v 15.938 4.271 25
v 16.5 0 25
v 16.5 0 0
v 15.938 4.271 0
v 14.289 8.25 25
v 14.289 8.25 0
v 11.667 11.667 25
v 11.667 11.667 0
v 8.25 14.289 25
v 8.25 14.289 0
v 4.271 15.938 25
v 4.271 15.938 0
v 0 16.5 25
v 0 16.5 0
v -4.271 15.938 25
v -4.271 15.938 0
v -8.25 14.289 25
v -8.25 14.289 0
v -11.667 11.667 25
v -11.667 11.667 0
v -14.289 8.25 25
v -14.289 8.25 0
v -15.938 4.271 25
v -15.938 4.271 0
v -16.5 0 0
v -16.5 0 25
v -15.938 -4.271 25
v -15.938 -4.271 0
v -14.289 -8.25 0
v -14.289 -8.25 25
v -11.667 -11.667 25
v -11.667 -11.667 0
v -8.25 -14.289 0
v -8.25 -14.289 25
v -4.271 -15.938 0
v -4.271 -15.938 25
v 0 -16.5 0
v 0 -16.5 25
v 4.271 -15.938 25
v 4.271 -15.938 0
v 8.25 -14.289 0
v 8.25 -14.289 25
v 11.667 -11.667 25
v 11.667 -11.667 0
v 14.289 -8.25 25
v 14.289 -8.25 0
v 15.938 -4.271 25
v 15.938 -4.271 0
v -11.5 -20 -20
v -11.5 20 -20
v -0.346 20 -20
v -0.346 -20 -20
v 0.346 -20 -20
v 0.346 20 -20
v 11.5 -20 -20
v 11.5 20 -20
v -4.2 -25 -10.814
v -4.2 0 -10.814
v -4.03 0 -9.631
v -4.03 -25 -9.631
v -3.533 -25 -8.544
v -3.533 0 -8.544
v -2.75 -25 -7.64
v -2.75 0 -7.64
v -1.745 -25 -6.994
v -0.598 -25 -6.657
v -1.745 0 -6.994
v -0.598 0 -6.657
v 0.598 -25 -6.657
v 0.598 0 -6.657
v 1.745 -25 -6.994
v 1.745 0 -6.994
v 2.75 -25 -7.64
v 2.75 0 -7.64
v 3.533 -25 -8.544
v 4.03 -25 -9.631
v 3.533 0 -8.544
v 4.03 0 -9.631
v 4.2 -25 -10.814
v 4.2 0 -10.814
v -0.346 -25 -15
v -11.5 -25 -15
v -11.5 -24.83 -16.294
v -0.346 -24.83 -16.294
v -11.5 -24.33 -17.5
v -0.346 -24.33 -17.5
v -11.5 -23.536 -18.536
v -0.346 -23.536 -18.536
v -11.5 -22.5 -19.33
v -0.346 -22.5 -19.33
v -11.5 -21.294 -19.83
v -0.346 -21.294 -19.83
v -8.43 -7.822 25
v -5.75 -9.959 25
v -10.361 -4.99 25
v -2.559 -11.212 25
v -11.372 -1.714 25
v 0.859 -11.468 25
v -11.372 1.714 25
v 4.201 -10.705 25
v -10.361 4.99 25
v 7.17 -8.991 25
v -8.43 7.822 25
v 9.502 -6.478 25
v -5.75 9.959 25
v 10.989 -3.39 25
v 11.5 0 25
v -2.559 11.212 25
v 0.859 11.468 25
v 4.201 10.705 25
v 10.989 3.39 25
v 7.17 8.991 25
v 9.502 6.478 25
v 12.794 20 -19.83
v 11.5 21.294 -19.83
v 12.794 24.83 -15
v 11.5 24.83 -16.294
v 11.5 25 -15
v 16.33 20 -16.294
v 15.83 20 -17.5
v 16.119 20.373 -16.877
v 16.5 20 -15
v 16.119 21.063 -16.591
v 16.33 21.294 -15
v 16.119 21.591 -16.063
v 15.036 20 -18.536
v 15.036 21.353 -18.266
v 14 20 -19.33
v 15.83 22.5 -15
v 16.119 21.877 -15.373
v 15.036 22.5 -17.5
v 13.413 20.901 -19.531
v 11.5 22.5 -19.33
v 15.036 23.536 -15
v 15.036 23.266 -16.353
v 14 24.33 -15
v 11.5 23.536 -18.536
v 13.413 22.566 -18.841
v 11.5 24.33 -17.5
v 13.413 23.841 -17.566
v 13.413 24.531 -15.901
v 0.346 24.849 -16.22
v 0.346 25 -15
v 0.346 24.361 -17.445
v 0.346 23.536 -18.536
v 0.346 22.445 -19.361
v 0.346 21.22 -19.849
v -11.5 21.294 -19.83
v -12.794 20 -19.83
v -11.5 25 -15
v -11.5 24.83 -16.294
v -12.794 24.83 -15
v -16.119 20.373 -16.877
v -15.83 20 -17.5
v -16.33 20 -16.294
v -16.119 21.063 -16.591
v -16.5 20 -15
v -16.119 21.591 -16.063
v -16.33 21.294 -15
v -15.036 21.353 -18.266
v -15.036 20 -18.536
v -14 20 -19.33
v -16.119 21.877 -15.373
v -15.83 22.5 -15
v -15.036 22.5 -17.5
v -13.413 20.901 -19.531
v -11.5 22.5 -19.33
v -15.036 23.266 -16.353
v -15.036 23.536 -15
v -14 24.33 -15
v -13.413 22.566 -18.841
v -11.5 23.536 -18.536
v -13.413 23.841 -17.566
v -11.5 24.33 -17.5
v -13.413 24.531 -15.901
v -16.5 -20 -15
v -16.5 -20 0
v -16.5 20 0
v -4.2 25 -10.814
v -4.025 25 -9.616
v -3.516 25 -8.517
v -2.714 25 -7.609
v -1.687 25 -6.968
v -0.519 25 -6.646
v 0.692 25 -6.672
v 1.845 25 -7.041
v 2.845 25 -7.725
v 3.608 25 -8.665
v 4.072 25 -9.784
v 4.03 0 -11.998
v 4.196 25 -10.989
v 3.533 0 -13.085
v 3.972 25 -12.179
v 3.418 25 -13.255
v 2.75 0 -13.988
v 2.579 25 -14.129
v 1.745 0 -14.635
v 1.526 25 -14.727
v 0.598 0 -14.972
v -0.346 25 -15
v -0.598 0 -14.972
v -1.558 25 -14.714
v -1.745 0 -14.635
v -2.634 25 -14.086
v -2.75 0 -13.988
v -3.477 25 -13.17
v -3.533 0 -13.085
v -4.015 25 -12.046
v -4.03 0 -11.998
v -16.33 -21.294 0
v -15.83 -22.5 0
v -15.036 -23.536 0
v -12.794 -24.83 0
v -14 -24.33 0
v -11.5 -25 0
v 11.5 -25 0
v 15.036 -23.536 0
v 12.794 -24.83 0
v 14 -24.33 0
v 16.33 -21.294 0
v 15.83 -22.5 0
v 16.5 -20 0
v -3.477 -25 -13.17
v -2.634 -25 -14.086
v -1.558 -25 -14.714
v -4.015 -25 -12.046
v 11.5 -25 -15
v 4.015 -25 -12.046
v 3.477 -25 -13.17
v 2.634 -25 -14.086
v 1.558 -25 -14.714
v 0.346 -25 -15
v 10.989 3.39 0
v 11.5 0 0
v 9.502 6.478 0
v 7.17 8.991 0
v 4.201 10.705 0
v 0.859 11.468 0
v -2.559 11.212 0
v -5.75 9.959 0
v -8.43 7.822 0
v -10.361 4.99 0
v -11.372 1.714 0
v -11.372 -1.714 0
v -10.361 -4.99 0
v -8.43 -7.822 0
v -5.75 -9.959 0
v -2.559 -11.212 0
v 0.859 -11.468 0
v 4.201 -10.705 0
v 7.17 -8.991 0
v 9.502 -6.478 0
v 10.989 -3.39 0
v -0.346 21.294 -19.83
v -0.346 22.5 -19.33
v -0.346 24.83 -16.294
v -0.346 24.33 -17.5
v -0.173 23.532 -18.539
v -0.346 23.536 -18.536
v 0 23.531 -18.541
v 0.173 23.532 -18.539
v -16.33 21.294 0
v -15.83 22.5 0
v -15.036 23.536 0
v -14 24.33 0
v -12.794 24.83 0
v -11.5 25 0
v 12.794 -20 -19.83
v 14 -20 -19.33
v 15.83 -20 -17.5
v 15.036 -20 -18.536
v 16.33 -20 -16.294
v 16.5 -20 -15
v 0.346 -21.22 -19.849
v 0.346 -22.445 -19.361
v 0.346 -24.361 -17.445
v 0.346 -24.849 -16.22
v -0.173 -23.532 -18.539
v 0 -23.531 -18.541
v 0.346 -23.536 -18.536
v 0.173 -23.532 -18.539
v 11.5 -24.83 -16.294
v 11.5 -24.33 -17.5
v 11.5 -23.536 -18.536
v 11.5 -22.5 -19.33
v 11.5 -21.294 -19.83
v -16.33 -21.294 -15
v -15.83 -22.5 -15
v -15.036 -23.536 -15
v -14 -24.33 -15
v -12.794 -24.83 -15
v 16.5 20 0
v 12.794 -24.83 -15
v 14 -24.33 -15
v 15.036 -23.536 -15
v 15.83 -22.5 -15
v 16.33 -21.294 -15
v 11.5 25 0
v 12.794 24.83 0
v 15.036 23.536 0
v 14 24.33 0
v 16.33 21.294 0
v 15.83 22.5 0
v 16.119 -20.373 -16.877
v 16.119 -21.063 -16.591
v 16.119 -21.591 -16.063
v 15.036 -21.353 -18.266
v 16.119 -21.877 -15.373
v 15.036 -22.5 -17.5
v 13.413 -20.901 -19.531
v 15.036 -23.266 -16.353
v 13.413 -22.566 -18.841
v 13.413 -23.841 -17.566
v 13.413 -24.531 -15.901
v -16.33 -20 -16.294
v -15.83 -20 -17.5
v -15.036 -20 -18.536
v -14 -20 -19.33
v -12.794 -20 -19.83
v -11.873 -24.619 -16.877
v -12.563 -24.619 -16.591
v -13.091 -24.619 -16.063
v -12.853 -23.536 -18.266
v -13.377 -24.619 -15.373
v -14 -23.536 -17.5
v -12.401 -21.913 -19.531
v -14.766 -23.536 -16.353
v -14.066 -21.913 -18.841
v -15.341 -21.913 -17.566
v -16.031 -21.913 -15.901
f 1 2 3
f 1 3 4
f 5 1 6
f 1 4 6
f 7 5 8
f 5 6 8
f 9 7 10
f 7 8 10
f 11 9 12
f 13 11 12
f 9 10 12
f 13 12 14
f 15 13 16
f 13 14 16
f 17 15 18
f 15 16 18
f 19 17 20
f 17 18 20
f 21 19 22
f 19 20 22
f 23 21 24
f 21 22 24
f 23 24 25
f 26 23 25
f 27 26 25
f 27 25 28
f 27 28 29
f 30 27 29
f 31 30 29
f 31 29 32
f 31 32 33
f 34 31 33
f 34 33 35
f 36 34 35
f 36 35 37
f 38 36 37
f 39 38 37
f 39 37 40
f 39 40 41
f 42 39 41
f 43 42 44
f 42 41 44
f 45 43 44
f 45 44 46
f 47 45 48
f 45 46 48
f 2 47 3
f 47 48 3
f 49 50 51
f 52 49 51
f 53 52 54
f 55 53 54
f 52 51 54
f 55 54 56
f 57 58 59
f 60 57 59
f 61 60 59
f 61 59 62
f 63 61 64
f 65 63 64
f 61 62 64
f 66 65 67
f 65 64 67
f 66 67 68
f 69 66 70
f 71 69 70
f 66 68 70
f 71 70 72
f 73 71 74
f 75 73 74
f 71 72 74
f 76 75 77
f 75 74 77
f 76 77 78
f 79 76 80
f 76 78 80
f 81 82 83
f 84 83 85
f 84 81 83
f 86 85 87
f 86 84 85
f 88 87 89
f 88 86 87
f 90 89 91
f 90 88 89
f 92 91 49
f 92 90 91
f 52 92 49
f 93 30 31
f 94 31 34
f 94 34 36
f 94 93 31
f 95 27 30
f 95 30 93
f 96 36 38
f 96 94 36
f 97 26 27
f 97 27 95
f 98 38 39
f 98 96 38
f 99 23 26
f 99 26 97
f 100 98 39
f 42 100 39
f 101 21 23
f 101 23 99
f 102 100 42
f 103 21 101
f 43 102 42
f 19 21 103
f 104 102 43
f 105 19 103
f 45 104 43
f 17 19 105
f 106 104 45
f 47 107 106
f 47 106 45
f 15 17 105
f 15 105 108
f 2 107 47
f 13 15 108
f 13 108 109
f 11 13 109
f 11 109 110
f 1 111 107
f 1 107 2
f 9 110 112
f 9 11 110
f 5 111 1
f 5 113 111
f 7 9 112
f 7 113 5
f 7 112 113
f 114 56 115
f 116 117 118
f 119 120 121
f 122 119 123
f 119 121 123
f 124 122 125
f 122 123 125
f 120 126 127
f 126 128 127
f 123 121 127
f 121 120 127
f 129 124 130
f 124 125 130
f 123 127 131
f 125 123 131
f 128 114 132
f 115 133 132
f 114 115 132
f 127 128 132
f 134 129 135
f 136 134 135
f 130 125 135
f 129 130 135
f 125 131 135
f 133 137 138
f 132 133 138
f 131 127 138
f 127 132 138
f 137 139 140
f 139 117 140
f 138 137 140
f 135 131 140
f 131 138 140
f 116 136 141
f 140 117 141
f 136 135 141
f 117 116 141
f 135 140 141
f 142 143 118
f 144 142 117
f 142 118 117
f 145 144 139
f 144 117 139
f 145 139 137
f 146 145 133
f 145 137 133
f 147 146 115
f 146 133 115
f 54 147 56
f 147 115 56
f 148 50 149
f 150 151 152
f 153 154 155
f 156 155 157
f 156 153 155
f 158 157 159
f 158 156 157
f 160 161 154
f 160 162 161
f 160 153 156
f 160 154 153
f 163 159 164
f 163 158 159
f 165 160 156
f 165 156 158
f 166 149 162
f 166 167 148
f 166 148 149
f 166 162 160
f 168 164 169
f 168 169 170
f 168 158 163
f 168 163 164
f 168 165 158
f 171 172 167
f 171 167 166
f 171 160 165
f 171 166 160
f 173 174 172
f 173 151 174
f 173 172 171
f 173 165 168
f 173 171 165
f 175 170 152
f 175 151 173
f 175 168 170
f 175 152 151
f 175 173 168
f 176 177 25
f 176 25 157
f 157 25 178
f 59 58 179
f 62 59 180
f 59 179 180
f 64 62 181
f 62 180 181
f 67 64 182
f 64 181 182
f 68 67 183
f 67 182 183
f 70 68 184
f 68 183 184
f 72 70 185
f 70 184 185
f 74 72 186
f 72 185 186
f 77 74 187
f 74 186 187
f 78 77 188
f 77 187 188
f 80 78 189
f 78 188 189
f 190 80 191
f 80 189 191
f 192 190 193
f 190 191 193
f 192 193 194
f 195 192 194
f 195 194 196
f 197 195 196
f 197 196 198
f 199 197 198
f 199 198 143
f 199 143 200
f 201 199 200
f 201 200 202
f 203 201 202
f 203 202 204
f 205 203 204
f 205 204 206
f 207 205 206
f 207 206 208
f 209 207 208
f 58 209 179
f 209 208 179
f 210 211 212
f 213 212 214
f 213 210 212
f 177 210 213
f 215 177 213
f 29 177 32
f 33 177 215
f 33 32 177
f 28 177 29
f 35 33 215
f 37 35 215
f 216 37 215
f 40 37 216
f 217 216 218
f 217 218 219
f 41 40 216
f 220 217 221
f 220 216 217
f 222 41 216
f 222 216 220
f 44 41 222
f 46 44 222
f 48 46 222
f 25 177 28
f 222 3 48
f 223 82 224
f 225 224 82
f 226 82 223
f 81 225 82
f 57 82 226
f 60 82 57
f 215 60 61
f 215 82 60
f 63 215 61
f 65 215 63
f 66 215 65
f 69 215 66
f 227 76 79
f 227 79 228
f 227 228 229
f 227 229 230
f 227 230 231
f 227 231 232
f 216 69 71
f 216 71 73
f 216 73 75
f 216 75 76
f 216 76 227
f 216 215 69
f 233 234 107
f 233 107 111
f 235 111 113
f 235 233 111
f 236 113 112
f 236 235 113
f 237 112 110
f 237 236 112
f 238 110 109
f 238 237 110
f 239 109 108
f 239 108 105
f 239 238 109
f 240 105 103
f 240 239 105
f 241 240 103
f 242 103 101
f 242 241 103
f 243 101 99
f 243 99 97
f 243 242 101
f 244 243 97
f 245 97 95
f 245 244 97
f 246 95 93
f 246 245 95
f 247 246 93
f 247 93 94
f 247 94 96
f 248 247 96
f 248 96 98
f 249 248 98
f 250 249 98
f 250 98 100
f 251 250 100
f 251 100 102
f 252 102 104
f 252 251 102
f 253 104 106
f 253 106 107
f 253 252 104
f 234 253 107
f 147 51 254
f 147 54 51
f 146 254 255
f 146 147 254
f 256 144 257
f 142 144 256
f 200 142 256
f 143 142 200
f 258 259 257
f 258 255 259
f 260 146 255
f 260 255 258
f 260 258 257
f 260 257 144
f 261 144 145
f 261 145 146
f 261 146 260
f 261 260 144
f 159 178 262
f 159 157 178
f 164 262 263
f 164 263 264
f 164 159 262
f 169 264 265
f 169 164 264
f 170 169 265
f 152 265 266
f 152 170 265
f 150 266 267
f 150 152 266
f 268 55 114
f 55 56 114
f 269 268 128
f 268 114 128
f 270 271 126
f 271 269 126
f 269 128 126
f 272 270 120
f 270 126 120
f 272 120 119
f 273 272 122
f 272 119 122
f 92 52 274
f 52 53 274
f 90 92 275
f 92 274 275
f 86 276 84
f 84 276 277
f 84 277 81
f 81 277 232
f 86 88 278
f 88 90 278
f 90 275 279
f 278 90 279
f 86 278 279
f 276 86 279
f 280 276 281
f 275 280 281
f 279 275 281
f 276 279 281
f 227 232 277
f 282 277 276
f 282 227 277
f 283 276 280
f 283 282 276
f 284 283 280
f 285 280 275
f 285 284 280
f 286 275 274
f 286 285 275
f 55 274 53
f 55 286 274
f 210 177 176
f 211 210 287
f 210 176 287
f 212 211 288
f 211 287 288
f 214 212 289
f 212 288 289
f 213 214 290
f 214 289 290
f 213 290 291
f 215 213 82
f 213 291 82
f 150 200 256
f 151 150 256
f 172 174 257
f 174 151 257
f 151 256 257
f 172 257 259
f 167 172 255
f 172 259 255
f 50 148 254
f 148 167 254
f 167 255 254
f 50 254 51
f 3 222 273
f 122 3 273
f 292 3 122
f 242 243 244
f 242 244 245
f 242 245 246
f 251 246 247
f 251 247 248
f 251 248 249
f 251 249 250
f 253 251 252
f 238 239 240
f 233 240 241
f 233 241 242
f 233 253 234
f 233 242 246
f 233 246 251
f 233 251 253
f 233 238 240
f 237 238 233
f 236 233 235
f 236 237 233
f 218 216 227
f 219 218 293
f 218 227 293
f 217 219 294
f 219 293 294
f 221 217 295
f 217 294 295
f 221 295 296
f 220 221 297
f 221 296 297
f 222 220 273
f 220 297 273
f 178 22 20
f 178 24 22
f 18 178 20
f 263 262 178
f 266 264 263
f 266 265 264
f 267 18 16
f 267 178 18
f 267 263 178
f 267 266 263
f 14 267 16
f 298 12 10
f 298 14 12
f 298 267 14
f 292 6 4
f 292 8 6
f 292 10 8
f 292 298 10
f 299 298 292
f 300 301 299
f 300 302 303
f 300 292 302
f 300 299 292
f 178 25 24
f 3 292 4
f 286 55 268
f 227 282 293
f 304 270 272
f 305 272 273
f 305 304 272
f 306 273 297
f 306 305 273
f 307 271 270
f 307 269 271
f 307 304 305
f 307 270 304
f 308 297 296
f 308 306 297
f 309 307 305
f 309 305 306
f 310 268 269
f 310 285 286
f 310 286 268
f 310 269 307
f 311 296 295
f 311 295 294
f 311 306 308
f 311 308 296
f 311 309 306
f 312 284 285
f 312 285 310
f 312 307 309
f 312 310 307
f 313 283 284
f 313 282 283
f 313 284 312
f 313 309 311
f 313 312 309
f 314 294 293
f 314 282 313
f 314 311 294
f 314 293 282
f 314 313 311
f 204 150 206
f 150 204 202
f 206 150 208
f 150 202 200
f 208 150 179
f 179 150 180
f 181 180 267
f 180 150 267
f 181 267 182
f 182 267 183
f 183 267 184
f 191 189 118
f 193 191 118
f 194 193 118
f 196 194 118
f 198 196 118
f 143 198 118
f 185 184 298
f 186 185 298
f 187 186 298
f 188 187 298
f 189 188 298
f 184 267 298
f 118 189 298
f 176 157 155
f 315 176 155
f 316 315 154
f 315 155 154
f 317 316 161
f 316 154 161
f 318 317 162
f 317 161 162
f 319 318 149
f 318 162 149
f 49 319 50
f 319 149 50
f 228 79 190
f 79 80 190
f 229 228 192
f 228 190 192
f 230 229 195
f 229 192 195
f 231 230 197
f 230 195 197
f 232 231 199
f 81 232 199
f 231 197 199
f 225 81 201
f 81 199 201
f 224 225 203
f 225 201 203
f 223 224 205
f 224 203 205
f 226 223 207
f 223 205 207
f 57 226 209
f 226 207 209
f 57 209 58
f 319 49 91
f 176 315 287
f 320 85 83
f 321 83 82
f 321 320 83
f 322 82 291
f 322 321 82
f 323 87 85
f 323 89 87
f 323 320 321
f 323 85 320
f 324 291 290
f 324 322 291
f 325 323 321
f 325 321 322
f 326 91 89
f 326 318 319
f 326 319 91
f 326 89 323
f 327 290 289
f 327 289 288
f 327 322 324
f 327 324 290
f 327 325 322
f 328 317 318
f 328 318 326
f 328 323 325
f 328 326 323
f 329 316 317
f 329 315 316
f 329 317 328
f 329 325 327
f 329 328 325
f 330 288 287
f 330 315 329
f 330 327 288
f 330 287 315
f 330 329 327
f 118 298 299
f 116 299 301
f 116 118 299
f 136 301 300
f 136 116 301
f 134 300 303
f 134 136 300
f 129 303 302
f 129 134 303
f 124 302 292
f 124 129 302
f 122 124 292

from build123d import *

# Parameters (mm, degrees)
F0_R     = 16.5
F0_R_2   = 11.5
F1_DEPTH = 25
F2_W     = 33
F2_H     = 50
F3_DEPTH = 20
F5_D     = 8.4
F5_DEPTH = 25.001
F6_D     = 8.4
F7_R     = 5


with BuildPart() as f1:
    # F0 (on Top) → F1 (new body)
    with BuildSketch(Plane.XY):
        Circle(F0_R)
        Circle(F0_R_2, mode=Mode.SUBTRACT)
    extrude(amount=F1_DEPTH)

    # F2 (on Top) → F3 (join)
    with BuildSketch(Plane.XY):
        Rectangle(F2_W, F2_H)
    extrude(amount=-F3_DEPTH)

    # F5 (through all, one way)
    with BuildSketch(Plane(origin=(0, 0, 0), x_dir=(1, 0, 0), z_dir=(0, 1, 0))):
        with Locations((0, 10.8142616227)):
            Circle(F5_D / 2)
    extrude(amount=-F5_DEPTH, mode=Mode.SUBTRACT)

    # F6 (through all)
    with Locations(Plane.XZ):
        with Locations((0, -10.8142616227)):
            Hole(F6_D / 2)

    # F7
    f7_edges = [f1.edges().sort_by_distance(p)[0] for p in [
        (0, 25, -20),
        (-16.5, 0, -20),
        (0, -25, -20),
        (16.5, 0, -20),
        (-16.5, 25, -10),
        (16.5, 25, -10),
        (16.5, -25, -10),
        (-16.5, -25, -10),
    ]]
    fillet(f7_edges, radius=F7_R)


solid = f1.part
